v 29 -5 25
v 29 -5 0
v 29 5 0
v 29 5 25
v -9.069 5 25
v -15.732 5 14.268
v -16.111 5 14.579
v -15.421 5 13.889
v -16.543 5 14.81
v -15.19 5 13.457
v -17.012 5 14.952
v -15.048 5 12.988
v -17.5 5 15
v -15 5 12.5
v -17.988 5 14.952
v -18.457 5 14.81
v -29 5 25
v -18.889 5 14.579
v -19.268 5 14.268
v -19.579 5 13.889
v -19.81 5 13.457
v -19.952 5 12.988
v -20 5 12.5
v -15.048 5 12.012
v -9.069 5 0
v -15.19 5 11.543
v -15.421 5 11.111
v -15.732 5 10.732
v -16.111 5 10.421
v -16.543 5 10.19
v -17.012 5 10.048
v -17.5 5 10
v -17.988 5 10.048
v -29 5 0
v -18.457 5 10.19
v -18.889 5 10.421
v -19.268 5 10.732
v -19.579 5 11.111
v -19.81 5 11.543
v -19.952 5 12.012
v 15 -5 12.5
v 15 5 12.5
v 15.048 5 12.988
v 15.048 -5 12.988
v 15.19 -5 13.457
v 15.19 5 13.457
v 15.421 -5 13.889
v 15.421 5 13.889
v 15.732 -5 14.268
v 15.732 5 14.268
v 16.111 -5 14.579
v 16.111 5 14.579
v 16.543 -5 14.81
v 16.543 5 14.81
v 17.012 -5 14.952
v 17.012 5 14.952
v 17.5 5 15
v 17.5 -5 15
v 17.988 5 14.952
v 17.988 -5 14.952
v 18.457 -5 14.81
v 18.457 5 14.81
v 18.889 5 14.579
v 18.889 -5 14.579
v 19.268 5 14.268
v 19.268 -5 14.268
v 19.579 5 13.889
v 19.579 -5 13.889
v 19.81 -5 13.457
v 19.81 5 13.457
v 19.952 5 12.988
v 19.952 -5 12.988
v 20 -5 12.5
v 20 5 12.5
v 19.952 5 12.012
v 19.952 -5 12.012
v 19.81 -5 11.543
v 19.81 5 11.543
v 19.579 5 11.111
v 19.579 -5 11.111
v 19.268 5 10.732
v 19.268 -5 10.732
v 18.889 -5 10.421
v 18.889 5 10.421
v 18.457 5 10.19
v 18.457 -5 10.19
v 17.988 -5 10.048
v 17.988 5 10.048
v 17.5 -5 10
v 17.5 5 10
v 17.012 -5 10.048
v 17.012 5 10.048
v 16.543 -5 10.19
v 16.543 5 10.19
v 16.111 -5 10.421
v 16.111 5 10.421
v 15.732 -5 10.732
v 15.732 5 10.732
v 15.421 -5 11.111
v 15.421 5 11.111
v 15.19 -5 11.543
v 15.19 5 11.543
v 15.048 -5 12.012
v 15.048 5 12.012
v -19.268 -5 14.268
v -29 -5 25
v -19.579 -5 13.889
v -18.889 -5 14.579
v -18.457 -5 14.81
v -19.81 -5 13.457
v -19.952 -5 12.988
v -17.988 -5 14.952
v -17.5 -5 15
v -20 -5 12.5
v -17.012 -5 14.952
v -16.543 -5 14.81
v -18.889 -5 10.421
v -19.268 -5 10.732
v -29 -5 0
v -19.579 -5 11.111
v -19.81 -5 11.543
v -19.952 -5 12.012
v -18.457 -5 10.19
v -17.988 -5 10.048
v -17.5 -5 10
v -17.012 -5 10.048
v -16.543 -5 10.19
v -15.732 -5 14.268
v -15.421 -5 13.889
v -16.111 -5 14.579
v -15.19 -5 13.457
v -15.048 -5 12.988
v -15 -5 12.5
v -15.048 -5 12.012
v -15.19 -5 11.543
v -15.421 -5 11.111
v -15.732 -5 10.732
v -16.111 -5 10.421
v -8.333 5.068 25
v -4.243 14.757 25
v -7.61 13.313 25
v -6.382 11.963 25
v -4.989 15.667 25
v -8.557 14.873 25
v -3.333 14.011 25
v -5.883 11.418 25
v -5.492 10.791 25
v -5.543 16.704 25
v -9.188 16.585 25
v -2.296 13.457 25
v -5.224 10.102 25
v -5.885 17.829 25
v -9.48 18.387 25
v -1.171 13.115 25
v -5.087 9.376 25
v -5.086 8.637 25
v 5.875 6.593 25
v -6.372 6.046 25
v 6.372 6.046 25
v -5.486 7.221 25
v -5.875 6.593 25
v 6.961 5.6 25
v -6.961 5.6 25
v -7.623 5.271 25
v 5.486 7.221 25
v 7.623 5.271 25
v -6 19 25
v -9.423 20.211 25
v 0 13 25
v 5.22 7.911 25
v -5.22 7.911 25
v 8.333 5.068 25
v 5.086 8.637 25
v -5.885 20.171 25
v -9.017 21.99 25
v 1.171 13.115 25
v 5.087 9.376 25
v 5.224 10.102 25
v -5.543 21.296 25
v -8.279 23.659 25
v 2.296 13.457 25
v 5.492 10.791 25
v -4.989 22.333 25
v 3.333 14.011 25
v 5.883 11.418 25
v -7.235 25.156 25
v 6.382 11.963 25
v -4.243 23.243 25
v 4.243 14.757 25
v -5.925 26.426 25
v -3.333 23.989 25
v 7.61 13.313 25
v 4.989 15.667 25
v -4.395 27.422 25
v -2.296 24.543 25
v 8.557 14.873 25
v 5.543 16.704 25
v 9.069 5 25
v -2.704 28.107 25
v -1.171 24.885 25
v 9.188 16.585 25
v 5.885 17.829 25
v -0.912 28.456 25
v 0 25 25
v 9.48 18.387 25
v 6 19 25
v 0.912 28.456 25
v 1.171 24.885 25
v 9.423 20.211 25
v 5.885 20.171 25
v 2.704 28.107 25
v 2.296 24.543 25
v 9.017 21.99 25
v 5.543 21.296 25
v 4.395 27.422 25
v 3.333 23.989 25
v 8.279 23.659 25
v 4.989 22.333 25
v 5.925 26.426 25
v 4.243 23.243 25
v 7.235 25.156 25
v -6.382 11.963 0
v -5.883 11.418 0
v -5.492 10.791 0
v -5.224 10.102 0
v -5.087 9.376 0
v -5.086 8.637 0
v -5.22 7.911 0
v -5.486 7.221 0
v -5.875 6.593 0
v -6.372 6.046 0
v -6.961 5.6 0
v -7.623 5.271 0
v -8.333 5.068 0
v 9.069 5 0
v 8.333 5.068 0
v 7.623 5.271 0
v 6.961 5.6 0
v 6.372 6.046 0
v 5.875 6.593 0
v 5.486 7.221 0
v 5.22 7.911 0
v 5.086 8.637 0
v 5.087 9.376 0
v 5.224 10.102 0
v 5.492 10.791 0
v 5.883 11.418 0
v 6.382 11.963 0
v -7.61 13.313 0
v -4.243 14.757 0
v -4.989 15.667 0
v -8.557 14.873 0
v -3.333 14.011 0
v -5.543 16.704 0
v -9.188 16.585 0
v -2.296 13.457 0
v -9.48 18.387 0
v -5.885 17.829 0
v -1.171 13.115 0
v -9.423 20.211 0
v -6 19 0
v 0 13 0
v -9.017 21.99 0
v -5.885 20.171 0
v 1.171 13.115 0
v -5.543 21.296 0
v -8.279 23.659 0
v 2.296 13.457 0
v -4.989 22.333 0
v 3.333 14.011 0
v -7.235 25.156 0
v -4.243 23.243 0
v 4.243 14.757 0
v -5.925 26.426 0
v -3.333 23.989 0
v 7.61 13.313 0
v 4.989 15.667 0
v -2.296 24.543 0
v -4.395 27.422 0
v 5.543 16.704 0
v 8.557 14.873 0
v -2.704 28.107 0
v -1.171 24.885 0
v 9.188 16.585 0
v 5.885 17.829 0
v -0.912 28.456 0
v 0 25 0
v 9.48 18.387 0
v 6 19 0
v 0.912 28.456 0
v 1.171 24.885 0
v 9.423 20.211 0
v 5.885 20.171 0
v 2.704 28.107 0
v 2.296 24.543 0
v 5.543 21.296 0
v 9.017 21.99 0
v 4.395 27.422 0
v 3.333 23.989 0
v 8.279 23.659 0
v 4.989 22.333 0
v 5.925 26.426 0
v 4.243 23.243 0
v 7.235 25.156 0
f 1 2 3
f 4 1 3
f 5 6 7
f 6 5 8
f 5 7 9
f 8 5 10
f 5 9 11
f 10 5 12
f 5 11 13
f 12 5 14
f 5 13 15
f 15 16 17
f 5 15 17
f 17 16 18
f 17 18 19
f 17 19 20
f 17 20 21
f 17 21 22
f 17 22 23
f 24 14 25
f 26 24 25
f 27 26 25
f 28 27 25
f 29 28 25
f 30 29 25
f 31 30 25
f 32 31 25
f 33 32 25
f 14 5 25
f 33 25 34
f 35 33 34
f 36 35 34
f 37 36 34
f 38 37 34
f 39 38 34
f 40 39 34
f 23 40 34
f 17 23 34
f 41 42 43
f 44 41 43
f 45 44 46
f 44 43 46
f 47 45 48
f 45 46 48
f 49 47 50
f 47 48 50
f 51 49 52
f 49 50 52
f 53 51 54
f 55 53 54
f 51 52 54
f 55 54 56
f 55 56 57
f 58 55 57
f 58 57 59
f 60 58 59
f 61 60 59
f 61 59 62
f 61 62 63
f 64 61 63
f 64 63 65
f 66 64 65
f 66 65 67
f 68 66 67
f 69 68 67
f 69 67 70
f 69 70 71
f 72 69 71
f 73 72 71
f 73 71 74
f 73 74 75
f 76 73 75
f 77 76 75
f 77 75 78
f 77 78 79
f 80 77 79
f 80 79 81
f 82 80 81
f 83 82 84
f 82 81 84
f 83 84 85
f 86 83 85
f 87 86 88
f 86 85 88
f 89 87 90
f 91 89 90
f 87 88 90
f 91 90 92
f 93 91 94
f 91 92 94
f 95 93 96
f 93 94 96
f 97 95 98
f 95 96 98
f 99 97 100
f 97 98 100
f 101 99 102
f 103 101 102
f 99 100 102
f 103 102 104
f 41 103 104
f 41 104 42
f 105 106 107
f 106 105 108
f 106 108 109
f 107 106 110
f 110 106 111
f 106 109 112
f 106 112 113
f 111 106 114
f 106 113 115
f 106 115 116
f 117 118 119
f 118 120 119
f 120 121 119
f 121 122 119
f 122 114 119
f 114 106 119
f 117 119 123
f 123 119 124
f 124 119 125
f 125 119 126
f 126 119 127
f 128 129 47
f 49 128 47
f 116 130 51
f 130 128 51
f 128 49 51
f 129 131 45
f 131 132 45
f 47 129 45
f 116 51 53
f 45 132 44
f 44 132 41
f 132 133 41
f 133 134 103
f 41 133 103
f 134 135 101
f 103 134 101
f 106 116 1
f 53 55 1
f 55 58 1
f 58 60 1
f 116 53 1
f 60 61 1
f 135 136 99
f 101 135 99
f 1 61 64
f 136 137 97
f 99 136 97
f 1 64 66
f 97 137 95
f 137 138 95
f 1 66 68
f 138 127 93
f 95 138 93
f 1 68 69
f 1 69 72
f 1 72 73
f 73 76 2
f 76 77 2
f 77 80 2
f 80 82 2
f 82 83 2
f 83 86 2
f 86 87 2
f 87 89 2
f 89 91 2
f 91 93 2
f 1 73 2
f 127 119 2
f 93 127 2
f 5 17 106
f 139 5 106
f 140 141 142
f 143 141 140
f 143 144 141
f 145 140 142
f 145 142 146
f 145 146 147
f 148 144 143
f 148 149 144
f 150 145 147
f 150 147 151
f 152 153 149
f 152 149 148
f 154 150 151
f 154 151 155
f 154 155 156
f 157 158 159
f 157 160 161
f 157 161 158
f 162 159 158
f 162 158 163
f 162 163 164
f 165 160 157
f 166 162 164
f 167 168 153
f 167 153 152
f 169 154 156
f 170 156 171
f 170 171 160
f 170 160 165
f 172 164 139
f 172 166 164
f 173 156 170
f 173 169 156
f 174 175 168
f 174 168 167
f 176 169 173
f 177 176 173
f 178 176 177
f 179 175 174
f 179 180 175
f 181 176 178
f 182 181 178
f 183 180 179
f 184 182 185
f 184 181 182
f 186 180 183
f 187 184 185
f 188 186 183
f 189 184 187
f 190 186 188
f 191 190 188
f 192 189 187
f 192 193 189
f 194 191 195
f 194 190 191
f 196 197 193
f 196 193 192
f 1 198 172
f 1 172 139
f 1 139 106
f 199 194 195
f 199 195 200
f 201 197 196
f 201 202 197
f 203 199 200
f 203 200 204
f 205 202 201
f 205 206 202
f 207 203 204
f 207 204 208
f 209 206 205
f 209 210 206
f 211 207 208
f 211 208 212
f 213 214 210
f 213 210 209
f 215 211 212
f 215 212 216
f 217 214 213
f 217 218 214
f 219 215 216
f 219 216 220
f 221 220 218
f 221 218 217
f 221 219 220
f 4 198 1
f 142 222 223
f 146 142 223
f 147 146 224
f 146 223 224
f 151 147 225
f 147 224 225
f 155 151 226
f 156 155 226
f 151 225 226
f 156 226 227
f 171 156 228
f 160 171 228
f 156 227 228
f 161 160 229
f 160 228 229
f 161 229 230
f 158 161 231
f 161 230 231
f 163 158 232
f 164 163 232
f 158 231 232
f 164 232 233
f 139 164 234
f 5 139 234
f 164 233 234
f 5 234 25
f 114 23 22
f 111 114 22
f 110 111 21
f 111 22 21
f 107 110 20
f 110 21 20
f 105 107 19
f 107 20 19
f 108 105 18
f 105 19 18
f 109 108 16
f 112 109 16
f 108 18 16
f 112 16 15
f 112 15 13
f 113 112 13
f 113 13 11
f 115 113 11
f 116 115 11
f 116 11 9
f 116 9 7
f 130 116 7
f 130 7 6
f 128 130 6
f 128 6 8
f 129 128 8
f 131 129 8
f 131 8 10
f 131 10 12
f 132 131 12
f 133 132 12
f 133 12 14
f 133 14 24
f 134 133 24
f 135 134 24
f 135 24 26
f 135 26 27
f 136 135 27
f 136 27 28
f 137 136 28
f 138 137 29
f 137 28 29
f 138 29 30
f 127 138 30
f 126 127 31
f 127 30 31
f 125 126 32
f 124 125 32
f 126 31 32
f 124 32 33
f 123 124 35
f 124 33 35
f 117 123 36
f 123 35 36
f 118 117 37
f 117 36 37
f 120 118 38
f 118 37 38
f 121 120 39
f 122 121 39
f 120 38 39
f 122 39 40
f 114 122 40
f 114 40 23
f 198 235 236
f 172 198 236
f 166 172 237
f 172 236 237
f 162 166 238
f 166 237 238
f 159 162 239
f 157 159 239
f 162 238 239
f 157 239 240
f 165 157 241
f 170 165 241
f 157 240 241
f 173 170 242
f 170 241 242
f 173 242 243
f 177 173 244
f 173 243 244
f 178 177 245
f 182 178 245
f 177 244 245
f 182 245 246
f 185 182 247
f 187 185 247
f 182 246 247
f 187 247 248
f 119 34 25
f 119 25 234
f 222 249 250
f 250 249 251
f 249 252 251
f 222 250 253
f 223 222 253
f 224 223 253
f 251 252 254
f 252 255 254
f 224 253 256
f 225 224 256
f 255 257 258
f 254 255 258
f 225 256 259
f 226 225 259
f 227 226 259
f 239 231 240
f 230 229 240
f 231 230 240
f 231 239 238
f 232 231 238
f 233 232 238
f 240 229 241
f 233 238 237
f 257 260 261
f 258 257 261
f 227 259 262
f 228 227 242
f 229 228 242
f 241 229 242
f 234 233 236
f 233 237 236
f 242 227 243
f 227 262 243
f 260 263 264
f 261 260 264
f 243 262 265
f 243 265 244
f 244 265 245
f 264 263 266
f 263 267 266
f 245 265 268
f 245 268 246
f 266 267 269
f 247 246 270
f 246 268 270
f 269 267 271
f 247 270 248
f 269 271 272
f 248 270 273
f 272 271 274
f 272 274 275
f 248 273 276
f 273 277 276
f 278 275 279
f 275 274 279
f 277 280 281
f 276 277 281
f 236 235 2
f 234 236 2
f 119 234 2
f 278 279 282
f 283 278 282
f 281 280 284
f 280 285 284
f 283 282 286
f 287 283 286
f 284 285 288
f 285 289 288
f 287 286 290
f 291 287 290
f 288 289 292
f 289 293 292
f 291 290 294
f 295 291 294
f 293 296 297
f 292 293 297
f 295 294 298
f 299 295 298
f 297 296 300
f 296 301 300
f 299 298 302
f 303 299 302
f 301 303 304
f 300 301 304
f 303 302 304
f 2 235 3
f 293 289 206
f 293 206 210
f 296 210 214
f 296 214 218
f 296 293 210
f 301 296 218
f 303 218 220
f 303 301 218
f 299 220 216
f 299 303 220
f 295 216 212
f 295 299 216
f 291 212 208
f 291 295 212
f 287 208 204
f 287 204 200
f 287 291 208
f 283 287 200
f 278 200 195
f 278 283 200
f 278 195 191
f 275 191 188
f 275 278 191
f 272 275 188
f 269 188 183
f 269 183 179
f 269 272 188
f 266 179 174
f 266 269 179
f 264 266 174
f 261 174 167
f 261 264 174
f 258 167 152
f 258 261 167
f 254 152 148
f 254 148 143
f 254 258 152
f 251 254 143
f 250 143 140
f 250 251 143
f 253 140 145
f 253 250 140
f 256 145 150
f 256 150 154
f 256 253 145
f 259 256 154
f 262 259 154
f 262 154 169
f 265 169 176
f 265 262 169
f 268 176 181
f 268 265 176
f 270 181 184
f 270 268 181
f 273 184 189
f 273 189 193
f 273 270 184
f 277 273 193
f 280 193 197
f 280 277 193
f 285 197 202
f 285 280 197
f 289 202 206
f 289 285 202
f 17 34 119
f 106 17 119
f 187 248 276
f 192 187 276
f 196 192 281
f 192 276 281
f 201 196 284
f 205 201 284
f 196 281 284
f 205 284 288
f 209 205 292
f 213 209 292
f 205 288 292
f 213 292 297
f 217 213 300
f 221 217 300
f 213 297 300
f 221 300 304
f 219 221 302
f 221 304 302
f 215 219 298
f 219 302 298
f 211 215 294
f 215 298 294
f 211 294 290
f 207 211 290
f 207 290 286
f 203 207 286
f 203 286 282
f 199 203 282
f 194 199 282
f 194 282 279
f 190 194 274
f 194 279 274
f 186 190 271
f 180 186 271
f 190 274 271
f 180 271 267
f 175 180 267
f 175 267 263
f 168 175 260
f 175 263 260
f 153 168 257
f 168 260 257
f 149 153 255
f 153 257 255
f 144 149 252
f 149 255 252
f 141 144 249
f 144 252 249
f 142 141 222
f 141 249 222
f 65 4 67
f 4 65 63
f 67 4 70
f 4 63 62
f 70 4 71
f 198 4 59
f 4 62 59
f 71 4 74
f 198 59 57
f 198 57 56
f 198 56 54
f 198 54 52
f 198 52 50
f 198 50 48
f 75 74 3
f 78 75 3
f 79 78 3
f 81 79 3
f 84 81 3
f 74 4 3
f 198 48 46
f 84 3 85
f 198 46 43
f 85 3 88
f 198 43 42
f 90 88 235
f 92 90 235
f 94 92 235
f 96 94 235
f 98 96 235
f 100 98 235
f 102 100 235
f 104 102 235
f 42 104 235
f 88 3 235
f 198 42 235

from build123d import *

# Parameters (mm, degrees)
F0_R     = 6
F1_DEPTH = 25
F3_D     = 5


with BuildPart() as f1:
    # F0 (on Top) → F1 (new body)
    with BuildSketch(Plane.XY):
        with BuildLine():
            Line((-9.069179, 5), (-29, 5))
            Line((-29, 5), (-29, -5))
            Line((-29, -5), (29, -5))
            Line((29, -5), (29, 5))
            Line((29, 5), (9.069179, 5))
            ThreePointArc((9.069179, 5), (5.337433, 7.559835), (6.382015, 11.962963))
            ThreePointArc((6.382015, 11.962963), (0, 28.5), (-6.382015, 11.962963))
            ThreePointArc((-6.382015, 11.962963), (-5.337433, 7.559835), (-9.069179, 5))
        make_face()
        with Locations((0, 19)):
            Circle(F0_R, mode=Mode.SUBTRACT)
    extrude(amount=F1_DEPTH)

    # F3 (through all)
    with Locations(Plane.XZ.offset(5)):
        with Locations((-17.5, 12.5), (17.5, 12.5)):
            Hole(F3_D / 2)


solid = f1.part
